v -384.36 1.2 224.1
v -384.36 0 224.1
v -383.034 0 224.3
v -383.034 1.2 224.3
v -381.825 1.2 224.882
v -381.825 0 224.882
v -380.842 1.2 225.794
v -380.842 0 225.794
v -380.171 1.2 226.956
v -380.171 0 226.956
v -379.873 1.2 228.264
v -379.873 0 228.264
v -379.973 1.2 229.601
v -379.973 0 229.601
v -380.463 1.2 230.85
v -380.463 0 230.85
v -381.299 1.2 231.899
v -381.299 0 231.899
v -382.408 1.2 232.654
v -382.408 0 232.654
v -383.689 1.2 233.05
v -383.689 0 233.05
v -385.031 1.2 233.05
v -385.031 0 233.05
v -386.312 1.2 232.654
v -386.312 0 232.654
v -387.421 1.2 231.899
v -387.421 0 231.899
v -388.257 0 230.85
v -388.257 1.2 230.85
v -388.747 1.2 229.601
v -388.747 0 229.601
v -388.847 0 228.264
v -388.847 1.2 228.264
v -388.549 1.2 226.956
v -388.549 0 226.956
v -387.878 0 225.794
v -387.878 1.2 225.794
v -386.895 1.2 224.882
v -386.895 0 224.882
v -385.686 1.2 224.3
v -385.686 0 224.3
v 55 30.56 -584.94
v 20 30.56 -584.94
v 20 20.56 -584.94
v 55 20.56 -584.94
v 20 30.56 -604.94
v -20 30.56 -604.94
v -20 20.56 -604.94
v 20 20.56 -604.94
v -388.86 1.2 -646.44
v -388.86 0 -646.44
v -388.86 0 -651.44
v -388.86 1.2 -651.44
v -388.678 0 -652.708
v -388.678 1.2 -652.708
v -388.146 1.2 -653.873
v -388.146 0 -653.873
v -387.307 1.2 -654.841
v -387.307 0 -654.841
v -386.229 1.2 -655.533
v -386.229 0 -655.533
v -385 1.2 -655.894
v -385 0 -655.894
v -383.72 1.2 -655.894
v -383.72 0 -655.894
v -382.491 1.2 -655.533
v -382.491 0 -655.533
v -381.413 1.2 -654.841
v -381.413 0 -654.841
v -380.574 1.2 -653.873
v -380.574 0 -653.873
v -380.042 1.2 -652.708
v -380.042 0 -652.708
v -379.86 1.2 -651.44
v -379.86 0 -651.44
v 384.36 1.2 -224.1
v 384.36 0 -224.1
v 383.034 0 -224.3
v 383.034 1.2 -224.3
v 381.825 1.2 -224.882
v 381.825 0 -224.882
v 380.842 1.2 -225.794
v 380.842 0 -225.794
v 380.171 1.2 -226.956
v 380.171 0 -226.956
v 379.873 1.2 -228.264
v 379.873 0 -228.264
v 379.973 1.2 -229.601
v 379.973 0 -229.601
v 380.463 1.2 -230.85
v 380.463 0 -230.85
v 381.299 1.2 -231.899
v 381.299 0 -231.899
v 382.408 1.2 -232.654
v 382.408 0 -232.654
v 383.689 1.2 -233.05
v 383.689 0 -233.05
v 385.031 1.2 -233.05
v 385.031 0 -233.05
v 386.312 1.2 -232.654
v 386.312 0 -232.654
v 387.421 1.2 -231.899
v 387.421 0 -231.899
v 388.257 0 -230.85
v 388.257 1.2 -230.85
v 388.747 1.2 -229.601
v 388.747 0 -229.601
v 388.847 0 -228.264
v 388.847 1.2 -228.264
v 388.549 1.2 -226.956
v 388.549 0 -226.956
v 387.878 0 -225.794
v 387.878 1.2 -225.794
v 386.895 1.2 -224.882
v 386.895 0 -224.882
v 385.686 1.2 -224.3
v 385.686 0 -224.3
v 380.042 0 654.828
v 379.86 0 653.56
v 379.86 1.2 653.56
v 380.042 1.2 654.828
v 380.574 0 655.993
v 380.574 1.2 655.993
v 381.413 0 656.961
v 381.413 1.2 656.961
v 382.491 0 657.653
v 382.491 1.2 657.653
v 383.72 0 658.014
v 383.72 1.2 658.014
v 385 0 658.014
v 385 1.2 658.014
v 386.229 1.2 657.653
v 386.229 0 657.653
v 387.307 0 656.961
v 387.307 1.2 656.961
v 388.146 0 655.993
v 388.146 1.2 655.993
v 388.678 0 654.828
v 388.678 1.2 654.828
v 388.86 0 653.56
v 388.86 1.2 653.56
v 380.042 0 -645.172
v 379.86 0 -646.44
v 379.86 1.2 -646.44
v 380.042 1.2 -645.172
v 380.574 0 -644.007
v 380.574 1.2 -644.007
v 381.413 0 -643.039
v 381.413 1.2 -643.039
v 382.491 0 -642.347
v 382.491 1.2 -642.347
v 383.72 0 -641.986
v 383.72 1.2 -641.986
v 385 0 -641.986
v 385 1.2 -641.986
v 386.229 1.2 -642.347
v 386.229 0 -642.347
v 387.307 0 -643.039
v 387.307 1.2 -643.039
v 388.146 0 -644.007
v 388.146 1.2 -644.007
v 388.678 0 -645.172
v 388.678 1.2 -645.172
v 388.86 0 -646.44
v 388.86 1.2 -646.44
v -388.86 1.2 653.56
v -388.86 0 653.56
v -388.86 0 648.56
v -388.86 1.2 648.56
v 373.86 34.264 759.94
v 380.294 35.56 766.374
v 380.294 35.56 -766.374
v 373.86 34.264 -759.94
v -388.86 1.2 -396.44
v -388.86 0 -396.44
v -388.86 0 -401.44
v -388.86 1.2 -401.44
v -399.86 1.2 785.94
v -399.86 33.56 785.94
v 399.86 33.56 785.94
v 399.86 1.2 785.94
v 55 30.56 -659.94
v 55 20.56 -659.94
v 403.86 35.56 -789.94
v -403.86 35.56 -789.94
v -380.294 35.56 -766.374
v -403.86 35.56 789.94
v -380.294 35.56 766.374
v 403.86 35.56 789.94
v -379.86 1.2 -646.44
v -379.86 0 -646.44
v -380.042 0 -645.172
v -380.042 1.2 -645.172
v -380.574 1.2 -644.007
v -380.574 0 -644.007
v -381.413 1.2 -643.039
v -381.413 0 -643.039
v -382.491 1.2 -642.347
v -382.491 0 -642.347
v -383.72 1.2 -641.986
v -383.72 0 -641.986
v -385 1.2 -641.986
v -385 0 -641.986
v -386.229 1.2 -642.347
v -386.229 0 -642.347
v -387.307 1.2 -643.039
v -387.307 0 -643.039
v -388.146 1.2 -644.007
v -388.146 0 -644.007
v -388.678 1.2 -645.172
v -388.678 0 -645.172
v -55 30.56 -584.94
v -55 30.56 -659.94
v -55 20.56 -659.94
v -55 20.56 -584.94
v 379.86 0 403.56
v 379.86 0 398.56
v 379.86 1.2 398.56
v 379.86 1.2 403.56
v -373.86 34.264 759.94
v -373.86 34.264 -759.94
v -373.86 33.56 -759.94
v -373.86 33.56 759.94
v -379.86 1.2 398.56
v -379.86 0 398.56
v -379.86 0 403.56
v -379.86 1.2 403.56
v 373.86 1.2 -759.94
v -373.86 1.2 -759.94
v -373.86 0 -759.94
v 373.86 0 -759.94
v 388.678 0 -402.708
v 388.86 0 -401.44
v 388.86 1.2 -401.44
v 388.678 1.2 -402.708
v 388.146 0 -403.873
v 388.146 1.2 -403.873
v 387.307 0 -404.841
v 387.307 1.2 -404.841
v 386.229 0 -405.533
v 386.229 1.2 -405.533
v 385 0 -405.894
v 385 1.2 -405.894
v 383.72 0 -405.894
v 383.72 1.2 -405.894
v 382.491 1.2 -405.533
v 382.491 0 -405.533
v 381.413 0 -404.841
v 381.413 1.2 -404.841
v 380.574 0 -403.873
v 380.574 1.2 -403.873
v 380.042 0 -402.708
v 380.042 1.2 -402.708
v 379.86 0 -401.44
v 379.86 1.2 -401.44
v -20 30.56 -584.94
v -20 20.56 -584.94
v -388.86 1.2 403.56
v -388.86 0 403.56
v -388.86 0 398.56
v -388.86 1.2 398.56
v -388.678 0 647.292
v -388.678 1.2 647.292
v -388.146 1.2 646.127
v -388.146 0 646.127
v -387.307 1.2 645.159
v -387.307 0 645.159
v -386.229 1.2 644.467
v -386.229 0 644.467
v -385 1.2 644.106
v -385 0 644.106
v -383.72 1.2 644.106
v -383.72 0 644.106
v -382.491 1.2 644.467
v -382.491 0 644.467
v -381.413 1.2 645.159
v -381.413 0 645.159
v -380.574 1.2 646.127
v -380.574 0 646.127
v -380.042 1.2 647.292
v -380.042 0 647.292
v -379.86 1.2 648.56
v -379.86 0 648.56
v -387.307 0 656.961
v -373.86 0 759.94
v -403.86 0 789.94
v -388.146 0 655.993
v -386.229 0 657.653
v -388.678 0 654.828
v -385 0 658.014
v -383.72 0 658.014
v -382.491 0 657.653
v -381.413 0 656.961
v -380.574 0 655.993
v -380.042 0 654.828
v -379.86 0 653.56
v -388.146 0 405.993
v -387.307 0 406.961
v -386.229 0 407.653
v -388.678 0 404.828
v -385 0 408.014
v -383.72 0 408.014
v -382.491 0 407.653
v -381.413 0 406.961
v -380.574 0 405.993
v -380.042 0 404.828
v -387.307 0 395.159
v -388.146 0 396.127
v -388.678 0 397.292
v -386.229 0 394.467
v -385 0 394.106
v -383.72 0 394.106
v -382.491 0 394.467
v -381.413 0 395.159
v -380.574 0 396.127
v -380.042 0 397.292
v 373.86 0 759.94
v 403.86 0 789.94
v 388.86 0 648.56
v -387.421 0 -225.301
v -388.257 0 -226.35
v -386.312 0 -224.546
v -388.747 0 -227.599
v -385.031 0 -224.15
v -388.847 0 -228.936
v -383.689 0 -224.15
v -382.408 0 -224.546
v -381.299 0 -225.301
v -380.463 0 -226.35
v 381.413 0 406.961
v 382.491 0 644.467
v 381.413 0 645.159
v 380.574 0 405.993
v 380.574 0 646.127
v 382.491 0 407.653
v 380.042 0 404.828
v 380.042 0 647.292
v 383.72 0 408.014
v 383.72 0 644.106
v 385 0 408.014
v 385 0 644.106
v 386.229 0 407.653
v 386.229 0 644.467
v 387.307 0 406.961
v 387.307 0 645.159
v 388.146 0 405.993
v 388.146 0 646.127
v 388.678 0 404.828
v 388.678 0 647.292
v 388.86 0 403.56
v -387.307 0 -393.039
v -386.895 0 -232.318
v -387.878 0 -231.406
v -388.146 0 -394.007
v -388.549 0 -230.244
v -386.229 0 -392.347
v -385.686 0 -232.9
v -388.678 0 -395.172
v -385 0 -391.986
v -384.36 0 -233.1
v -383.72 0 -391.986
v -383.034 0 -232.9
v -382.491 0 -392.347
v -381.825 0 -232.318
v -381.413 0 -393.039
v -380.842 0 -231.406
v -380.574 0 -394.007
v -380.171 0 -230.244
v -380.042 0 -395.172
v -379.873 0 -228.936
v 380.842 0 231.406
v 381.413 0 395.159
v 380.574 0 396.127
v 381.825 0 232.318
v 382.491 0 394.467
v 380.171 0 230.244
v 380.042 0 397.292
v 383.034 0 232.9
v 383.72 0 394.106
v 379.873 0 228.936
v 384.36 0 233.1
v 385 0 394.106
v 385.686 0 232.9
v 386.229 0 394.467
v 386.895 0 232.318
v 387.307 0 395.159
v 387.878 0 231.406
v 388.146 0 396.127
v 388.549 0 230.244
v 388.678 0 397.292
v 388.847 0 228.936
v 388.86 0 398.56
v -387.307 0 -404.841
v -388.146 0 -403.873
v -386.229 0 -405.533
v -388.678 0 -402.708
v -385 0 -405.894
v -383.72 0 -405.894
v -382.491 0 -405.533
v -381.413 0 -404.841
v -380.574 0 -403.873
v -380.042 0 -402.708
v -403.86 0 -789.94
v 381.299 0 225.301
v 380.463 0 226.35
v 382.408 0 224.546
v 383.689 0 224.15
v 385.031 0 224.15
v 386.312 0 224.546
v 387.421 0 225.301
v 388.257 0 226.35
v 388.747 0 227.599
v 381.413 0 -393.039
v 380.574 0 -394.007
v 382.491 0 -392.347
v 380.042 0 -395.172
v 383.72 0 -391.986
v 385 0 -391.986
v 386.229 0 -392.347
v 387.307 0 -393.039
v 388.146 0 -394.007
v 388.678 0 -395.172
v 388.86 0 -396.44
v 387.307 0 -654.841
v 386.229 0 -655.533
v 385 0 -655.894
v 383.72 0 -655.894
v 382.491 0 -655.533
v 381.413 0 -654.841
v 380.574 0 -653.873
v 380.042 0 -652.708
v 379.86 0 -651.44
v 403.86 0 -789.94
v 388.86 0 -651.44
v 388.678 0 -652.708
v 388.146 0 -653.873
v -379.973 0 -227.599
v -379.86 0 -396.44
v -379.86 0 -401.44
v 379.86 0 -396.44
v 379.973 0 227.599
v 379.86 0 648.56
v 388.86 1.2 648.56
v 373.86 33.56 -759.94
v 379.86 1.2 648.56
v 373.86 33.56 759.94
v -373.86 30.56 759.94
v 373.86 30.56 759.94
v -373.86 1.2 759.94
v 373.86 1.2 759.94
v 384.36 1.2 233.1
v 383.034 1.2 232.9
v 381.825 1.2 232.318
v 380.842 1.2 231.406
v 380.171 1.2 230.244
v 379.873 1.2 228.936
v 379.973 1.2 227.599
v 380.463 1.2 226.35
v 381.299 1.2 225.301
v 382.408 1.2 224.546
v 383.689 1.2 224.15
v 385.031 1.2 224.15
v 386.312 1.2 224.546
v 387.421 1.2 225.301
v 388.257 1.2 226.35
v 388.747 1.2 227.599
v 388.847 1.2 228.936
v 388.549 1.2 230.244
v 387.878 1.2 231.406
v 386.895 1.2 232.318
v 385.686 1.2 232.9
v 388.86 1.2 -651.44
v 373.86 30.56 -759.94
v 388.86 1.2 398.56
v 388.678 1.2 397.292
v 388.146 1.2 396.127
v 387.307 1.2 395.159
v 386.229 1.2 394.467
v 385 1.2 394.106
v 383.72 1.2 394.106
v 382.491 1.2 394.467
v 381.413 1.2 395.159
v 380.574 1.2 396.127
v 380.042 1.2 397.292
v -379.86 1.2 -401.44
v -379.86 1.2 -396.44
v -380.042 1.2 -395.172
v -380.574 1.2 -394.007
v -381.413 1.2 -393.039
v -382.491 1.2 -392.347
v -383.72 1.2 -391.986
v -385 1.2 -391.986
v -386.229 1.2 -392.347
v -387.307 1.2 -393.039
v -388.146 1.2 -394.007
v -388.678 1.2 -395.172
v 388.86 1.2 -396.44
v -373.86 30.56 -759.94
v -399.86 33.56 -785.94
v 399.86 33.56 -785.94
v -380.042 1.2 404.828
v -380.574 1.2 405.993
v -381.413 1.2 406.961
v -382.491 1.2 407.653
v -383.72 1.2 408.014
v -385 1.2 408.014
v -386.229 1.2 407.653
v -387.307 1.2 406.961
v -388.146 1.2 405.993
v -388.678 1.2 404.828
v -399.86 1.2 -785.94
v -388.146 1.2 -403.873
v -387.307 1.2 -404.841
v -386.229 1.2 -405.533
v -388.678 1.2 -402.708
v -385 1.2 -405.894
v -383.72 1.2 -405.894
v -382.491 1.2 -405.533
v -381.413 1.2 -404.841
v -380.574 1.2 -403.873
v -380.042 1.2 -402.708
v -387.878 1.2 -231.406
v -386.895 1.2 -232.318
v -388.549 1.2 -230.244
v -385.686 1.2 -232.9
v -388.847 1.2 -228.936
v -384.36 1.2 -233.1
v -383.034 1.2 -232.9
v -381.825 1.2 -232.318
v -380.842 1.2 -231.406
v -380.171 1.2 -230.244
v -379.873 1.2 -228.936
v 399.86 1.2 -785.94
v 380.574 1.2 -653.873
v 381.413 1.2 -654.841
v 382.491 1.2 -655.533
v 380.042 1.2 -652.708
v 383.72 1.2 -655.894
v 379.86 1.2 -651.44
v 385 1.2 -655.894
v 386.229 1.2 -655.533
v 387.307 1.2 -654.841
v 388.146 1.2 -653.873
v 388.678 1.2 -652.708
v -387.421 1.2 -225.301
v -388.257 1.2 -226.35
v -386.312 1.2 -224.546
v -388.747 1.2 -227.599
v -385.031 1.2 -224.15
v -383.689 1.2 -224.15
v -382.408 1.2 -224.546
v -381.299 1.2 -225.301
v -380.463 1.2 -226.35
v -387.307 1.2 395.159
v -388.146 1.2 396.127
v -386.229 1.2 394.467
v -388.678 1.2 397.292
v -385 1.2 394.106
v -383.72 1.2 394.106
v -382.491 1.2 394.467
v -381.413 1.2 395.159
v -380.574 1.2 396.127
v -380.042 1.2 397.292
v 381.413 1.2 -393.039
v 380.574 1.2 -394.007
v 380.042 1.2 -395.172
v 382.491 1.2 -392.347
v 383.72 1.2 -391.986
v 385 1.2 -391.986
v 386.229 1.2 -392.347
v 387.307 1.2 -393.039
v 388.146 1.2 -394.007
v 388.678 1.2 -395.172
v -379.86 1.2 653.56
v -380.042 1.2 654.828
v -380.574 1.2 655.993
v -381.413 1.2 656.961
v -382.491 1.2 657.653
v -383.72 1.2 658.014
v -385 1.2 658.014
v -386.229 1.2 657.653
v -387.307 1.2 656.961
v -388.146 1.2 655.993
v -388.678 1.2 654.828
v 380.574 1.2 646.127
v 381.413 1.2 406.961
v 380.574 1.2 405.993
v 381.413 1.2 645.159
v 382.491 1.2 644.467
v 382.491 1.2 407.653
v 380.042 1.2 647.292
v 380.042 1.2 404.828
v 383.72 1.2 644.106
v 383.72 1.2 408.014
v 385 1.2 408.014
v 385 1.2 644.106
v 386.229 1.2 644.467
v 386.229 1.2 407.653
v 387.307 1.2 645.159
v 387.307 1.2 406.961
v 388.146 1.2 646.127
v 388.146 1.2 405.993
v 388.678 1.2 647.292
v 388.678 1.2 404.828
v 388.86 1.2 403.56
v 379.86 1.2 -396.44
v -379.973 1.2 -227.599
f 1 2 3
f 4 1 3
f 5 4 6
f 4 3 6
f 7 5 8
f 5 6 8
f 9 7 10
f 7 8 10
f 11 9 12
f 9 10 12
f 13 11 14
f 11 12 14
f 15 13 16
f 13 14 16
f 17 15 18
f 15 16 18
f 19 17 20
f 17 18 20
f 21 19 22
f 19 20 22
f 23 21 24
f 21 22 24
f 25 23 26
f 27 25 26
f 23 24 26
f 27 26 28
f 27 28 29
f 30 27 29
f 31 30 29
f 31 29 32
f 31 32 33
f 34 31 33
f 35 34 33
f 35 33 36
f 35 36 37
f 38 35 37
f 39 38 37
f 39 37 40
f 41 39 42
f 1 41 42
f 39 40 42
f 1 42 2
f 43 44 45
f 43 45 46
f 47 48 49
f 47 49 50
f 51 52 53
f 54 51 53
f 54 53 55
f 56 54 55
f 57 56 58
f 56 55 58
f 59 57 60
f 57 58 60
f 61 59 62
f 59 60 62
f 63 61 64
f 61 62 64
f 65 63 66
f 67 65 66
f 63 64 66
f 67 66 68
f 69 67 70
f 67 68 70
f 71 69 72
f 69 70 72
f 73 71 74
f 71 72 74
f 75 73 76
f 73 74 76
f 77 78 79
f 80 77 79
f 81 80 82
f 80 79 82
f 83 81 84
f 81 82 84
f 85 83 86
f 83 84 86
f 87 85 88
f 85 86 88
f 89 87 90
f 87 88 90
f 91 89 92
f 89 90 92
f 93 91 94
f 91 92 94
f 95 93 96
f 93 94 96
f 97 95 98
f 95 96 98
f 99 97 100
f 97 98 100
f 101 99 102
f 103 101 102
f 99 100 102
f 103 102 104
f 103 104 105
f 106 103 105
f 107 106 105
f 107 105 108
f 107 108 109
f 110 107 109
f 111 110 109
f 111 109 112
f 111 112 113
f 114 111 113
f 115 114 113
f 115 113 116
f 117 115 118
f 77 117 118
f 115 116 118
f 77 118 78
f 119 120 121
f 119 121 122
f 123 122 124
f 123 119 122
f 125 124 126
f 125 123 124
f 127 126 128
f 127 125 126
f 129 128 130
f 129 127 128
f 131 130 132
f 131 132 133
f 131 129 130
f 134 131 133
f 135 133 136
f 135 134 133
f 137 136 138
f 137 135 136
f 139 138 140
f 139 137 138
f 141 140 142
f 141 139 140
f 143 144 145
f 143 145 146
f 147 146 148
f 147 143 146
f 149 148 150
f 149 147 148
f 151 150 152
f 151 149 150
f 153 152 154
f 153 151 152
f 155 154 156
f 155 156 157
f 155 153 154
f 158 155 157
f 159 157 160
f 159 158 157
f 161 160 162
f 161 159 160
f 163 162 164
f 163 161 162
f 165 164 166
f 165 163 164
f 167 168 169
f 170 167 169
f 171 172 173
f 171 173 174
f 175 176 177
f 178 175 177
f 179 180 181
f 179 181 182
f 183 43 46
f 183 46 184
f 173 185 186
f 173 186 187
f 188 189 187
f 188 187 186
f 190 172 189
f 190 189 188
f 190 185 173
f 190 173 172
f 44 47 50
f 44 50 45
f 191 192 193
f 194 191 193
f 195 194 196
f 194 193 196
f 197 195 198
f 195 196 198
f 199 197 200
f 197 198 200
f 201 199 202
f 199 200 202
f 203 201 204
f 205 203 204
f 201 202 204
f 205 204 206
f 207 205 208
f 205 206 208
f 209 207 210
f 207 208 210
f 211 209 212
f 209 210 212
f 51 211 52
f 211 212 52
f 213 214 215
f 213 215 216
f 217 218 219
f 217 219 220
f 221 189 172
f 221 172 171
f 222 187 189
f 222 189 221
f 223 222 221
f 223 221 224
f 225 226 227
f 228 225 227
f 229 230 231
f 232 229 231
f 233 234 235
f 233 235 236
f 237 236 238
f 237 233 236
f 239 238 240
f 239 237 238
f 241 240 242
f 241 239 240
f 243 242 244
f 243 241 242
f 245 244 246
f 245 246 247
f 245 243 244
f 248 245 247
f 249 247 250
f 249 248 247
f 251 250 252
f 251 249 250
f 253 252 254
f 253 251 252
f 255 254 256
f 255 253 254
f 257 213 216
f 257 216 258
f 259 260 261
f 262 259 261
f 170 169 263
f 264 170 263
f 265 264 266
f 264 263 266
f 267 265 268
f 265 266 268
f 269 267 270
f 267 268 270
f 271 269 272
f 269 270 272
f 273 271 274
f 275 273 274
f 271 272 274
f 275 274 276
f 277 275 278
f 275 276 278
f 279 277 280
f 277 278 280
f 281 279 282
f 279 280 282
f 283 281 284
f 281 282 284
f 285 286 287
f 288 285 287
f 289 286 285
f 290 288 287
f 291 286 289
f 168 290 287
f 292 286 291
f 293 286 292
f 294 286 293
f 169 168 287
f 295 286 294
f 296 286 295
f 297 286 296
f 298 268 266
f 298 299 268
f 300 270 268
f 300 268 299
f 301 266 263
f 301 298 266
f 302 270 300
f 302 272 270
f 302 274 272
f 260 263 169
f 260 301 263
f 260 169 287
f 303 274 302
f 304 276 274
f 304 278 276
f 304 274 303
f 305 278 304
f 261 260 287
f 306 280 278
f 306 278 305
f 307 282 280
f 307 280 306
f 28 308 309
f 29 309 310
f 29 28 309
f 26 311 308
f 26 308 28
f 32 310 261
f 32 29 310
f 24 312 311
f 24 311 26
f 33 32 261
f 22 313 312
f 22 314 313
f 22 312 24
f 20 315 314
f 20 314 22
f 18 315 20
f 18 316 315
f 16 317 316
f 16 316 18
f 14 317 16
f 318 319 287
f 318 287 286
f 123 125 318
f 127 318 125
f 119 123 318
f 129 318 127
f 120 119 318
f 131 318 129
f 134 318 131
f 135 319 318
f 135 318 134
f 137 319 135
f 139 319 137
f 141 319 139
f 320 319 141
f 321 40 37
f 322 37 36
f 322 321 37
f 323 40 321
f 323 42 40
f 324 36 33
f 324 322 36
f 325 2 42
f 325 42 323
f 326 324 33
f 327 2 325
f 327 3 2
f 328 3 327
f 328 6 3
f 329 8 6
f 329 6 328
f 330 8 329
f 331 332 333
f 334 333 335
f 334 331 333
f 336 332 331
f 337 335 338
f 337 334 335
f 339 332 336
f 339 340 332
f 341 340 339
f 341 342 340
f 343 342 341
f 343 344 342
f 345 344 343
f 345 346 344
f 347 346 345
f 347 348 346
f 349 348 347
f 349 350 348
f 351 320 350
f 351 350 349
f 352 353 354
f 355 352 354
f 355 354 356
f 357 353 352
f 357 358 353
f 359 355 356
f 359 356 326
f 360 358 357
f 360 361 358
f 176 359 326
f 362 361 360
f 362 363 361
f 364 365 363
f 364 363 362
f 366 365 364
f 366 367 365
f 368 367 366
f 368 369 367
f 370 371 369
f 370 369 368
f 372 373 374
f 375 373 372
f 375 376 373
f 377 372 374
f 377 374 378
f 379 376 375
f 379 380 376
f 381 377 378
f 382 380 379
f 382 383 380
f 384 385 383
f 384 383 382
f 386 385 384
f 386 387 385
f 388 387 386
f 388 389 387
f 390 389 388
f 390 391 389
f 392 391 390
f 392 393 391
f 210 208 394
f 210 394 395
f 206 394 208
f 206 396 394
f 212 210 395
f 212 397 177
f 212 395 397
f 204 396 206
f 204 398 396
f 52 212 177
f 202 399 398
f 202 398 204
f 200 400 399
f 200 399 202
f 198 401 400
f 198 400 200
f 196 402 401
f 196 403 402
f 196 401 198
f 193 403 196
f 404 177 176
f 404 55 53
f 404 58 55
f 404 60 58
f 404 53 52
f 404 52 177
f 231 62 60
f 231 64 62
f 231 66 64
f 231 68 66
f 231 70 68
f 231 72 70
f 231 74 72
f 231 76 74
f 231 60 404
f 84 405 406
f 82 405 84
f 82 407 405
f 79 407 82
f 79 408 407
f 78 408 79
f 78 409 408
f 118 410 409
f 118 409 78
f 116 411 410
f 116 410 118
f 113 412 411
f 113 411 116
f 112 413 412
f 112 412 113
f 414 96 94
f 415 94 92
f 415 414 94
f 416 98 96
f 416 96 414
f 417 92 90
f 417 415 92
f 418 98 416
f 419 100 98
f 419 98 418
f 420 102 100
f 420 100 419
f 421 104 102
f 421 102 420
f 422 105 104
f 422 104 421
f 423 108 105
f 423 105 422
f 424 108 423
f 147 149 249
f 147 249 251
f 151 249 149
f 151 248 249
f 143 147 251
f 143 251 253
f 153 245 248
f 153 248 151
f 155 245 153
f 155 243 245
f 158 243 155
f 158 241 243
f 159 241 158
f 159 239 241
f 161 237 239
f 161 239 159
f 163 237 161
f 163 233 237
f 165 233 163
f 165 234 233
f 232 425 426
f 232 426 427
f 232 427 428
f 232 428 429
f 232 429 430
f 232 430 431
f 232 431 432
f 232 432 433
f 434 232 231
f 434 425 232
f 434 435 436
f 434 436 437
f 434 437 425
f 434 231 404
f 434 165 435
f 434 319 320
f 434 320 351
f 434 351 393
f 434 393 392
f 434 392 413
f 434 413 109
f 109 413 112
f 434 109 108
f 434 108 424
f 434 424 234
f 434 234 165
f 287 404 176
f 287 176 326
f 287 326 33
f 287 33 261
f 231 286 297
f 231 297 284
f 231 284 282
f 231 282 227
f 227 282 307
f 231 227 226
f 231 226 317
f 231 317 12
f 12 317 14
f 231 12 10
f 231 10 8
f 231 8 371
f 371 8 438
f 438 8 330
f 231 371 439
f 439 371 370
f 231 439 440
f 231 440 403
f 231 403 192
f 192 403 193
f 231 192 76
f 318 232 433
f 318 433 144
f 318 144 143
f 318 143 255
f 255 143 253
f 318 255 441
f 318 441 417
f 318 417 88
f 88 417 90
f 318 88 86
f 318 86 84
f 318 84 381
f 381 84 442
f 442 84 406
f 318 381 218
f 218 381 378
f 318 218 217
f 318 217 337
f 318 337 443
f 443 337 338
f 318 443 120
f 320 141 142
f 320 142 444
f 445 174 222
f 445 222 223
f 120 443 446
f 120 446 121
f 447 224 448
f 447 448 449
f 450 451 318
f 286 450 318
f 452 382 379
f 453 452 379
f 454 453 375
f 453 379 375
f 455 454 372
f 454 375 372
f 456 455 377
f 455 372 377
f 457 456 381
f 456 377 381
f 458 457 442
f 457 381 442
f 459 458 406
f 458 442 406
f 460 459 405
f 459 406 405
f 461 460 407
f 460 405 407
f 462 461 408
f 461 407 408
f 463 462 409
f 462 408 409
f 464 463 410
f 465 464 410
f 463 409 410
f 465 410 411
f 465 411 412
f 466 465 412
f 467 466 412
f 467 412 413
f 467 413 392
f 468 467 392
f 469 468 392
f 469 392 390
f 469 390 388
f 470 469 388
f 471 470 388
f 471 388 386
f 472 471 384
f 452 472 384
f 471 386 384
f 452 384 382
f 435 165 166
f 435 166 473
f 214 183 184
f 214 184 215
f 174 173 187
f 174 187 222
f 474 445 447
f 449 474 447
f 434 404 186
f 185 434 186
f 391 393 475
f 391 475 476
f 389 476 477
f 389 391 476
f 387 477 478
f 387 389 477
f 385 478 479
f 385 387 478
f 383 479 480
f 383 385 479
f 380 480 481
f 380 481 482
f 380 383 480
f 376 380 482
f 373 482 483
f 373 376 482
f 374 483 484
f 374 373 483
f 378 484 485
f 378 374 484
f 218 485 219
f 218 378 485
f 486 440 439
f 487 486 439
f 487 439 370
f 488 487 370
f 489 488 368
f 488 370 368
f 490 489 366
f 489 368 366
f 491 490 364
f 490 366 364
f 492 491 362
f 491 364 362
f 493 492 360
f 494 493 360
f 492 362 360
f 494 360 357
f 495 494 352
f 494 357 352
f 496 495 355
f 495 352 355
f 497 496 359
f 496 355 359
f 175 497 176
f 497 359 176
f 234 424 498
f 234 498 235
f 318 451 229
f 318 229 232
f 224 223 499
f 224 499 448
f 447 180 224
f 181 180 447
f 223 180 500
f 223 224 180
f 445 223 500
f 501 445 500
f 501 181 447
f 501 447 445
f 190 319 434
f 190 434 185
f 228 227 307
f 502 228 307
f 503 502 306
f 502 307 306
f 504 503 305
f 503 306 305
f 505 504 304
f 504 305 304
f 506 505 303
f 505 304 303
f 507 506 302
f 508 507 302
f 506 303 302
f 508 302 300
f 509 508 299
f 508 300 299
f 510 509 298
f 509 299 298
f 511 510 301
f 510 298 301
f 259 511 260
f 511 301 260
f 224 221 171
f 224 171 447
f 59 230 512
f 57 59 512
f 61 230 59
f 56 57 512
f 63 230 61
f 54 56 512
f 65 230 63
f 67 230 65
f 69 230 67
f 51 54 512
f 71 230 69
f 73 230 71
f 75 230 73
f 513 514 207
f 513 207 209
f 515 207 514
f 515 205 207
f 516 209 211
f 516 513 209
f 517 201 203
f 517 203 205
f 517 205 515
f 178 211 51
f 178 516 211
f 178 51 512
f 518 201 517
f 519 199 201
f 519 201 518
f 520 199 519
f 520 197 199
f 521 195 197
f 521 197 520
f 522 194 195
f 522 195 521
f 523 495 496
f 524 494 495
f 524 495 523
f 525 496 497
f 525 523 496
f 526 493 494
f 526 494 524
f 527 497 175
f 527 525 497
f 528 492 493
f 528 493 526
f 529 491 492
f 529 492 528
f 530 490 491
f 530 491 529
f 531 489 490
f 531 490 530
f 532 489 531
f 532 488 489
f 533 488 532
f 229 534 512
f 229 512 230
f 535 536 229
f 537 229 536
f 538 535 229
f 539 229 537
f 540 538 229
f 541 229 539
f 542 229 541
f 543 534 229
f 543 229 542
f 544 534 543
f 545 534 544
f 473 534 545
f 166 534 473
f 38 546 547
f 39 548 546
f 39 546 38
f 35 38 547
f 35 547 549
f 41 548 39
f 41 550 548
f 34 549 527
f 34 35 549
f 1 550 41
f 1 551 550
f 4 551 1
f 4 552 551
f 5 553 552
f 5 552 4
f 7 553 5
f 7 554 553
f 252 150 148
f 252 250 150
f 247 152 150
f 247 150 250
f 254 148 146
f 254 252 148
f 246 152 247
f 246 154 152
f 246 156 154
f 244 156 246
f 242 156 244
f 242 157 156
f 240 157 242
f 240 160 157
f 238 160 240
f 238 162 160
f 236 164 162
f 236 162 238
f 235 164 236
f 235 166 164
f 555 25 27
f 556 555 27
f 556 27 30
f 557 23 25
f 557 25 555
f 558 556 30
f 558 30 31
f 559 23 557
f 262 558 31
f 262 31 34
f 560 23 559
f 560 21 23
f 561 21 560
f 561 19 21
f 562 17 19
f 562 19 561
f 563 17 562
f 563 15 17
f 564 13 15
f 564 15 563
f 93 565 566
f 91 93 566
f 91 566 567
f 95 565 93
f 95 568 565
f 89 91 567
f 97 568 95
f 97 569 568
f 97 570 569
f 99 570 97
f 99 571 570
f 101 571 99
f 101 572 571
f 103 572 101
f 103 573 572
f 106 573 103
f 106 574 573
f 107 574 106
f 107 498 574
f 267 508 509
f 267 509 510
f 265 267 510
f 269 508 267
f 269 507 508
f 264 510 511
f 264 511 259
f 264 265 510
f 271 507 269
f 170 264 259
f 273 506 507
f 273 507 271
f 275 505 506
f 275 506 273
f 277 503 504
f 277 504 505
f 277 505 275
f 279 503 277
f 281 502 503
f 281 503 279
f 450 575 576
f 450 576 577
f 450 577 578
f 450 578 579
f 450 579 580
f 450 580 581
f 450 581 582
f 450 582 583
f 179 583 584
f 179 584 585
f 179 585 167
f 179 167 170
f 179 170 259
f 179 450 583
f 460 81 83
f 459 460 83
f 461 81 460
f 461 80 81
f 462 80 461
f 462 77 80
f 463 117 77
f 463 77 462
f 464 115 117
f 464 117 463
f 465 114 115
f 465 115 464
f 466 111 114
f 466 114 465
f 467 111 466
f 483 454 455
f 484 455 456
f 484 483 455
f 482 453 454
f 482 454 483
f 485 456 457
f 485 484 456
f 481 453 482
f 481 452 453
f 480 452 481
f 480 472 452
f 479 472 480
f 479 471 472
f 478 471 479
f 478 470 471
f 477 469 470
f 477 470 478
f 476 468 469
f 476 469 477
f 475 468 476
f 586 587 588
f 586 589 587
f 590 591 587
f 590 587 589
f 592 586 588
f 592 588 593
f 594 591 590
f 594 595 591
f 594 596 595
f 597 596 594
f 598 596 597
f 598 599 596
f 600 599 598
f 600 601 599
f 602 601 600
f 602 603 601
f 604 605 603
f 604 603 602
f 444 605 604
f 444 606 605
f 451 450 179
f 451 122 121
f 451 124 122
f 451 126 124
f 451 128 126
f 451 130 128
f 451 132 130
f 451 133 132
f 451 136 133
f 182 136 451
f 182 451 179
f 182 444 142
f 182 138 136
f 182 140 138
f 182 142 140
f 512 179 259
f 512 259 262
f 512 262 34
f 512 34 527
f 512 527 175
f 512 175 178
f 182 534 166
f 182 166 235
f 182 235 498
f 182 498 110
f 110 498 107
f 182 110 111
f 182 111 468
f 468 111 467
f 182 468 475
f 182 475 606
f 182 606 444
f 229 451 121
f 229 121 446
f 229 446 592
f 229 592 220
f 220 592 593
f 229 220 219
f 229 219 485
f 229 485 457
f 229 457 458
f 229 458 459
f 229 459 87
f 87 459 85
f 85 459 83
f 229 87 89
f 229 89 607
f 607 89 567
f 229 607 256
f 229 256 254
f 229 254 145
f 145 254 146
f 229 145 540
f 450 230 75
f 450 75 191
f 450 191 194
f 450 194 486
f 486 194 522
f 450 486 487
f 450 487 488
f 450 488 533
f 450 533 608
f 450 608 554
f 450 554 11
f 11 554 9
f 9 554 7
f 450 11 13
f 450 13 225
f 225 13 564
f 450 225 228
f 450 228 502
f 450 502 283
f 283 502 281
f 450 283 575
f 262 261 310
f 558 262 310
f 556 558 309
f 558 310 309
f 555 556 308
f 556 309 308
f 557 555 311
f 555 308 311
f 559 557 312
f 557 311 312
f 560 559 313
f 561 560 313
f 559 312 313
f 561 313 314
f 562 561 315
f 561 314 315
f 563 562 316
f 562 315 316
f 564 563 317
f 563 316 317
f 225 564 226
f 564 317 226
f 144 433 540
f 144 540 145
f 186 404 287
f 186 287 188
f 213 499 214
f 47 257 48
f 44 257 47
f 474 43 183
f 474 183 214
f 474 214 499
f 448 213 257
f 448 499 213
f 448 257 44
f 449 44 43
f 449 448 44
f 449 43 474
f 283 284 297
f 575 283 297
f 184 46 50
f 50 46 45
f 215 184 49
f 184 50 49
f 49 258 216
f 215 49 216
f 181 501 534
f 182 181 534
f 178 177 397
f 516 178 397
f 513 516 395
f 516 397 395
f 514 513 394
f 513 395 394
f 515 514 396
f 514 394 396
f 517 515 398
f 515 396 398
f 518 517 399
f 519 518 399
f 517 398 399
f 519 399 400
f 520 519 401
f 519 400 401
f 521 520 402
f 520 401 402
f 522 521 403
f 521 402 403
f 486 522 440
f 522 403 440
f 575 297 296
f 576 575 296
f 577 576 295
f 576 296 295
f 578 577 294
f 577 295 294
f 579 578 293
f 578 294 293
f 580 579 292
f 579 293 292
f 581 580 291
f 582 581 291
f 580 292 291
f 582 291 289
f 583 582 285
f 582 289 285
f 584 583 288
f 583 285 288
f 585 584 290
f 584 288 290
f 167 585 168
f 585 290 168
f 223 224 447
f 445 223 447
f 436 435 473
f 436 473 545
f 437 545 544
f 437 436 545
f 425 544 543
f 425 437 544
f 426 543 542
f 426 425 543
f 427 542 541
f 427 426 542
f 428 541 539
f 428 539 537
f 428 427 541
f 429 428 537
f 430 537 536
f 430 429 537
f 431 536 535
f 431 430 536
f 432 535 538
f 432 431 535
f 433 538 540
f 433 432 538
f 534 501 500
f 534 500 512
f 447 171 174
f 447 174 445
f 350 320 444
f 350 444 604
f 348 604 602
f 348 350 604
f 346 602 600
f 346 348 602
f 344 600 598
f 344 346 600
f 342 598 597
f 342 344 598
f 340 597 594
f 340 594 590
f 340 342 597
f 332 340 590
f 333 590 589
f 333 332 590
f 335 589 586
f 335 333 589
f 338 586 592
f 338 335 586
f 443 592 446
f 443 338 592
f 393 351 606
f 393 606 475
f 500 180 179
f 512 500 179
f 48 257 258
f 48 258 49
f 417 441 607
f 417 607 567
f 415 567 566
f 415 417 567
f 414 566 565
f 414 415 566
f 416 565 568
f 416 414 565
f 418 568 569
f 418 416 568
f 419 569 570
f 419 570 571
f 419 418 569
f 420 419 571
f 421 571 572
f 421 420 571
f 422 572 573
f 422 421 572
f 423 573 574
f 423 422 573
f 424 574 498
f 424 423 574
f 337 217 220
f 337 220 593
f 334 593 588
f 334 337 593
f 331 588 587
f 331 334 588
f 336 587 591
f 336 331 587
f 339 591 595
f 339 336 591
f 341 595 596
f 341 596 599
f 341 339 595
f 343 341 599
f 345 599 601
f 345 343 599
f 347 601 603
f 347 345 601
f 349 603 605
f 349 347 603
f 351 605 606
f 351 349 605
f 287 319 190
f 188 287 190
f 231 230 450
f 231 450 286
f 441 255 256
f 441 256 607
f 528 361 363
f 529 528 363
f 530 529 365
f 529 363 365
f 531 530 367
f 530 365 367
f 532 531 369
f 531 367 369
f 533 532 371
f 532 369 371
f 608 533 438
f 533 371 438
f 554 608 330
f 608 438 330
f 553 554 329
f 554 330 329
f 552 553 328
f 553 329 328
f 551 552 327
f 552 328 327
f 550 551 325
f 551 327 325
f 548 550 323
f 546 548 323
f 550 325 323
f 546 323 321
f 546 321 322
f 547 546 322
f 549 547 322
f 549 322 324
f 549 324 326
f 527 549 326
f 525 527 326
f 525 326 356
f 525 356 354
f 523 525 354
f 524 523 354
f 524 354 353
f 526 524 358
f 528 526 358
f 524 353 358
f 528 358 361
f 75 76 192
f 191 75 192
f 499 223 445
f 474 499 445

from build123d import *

# Parameters (mm, degrees)
SKETCH3_W                                 = 747.72
SKETCH3_H                                 = 1519.88
BOSS_EXTRUDE1_DEPTH                       = 3
BOSS_EXTRUDE2_DEPTH                       = 10
CUT_EXTRUDE1_DEPTH                        = 1.2
SKETCH8_R                                 = 4.5
EXTRA_CUT_HOLE_FOR_SIDE_PANEL_MOUNT_DEPTH = 1.2


with BuildPart() as part:
    # Sweep1: sweep along a path in Solar Panel Dimensions
    with BuildLine(Plane(origin=(0, 0, 0), x_dir=(1, 0, 0), z_dir=(0, 1, 0))) as sweep1_path:
        Line((-403.86, 789.94), (403.86, 789.94))
        Line((403.86, 789.94), (403.86, -789.94))
        Line((403.86, -789.94), (-403.86, -789.94))
        Line((-403.86, -789.94), (-403.86, 789.94))
    # Bracket → Sweep1 (sweep)
    with BuildSketch(Plane.XY):
        Polygon((403.86, 0), (373.86, 0), (373.86, 1.2), (399.86, 1.2), (399.86, 33.56), (373.86, 33.56), (373.86, 34.26412465), (380.294130539, 35.56), (403.86, 35.56), align=None)
    sweep(path=sweep1_path.line, transition=Transition.RIGHT)

    # Sketch5 → Cut-Extrude1 (cut)
    with BuildSketch(Plane(origin=(0, 0, 0), x_dir=(-1, 0, 0), z_dir=(0, -1, 0))):
        with BuildLine():
            Line((-379.86, 651.44), (-379.86, 646.44))
            ThreePointArc((-379.86, 646.44), (-384.36, 641.94), (-388.86, 646.44))
            Line((-388.86, 646.44), (-388.86, 651.44))
            ThreePointArc((-388.86, 651.44), (-384.36, 655.94), (-379.86, 651.44))
        make_face()
        with BuildLine():
            Line((-379.86, 401.44), (-379.86, 396.44))
            ThreePointArc((-379.86, 396.44), (-384.36, 391.94), (-388.86, 396.44))
            Line((-388.86, 396.44), (-388.86, 401.44))
            ThreePointArc((-388.86, 401.44), (-384.36, 405.94), (-379.86, 401.44))
        make_face()
        with BuildLine():
            Line((-379.86, -398.56), (-379.86, -403.56))
            ThreePointArc((-379.86, -403.56), (-384.36, -408.06), (-388.86, -403.56))
            Line((-388.86, -403.56), (-388.86, -398.56))
            ThreePointArc((-388.86, -398.56), (-384.36, -394.06), (-379.86, -398.56))
        make_face()
        with BuildLine():
            Line((-379.86, -648.56), (-379.86, -653.56))
            ThreePointArc((-379.86, -653.56), (-384.36, -658.06), (-388.86, -653.56))
            Line((-388.86, -653.56), (-388.86, -648.56))
            ThreePointArc((-388.86, -648.56), (-384.36, -644.06), (-379.86, -648.56))
        make_face()
        with BuildLine():
            Line((379.86, -648.56), (379.86, -653.56))
            ThreePointArc((379.86, -653.56), (384.36, -658.06), (388.86, -653.56))
            Line((388.86, -653.56), (388.86, -648.56))
            ThreePointArc((388.86, -648.56), (384.36, -644.06), (379.86, -648.56))
        make_face()
        with BuildLine():
            Line((379.86, 401.44), (379.86, 396.44))
            ThreePointArc((379.86, 396.44), (384.36, 391.94), (388.86, 396.44))
            Line((388.86, 396.44), (388.86, 401.44))
            ThreePointArc((388.86, 401.44), (384.36, 405.94), (379.86, 401.44))
        make_face()
        with BuildLine():
            Line((379.86, -398.56), (379.86, -403.56))
            ThreePointArc((379.86, -403.56), (384.36, -408.06), (388.86, -403.56))
            Line((388.86, -403.56), (388.86, -398.56))
            ThreePointArc((388.86, -398.56), (384.36, -394.06), (379.86, -398.56))
        make_face()
        with BuildLine():
            Line((379.86, 651.44), (379.86, 646.44))
            ThreePointArc((379.86, 646.44), (384.36, 641.94), (388.86, 646.44))
            Line((388.86, 646.44), (388.86, 651.44))
            ThreePointArc((388.86, 651.44), (384.36, 655.94), (379.86, 651.44))
        make_face()
    extrude(amount=-CUT_EXTRUDE1_DEPTH, mode=Mode.SUBTRACT)

    # Sketch8 → extra cut hole for side panel mount (cut)
    with BuildSketch(Plane.XZ):
        with Locations(Location((-384.36, 228.6, 0), (0, 0, 270))):
            Circle(SKETCH8_R)
        with Locations(Location((-384.36, -228.6, 0), (0, 0, 270))):
            Circle(SKETCH8_R)
        with Locations(Location((384.36, 228.6, 0), (0, 0, 90))):
            Circle(SKETCH8_R)
        with Locations(Location((384.36, -228.6, 0), (0, 0, 90))):
            Circle(SKETCH8_R)
    extrude(amount=-EXTRA_CUT_HOLE_FOR_SIDE_PANEL_MOUNT_DEPTH, mode=Mode.SUBTRACT)


with BuildPart() as body_2:
    # Sketch3 → Boss-Extrude1 (new body)
    with BuildSketch(Plane.XZ.offset(-33.56)):
        Rectangle(SKETCH3_W, SKETCH3_H)
    extrude(amount=BOSS_EXTRUDE1_DEPTH)

    # Sketch4 → Boss-Extrude2 (add)
    with BuildSketch(Plane.XZ.offset(-30.56)):
        Polygon((55, -659.94), (-55, -659.94), (-55, -584.94), (-20, -584.94), (-20, -604.94), (20, -604.94), (20, -584.94), (55, -584.94), align=None)
    extrude(amount=BOSS_EXTRUDE2_DEPTH)


solid = Compound([part.part, body_2.part])
